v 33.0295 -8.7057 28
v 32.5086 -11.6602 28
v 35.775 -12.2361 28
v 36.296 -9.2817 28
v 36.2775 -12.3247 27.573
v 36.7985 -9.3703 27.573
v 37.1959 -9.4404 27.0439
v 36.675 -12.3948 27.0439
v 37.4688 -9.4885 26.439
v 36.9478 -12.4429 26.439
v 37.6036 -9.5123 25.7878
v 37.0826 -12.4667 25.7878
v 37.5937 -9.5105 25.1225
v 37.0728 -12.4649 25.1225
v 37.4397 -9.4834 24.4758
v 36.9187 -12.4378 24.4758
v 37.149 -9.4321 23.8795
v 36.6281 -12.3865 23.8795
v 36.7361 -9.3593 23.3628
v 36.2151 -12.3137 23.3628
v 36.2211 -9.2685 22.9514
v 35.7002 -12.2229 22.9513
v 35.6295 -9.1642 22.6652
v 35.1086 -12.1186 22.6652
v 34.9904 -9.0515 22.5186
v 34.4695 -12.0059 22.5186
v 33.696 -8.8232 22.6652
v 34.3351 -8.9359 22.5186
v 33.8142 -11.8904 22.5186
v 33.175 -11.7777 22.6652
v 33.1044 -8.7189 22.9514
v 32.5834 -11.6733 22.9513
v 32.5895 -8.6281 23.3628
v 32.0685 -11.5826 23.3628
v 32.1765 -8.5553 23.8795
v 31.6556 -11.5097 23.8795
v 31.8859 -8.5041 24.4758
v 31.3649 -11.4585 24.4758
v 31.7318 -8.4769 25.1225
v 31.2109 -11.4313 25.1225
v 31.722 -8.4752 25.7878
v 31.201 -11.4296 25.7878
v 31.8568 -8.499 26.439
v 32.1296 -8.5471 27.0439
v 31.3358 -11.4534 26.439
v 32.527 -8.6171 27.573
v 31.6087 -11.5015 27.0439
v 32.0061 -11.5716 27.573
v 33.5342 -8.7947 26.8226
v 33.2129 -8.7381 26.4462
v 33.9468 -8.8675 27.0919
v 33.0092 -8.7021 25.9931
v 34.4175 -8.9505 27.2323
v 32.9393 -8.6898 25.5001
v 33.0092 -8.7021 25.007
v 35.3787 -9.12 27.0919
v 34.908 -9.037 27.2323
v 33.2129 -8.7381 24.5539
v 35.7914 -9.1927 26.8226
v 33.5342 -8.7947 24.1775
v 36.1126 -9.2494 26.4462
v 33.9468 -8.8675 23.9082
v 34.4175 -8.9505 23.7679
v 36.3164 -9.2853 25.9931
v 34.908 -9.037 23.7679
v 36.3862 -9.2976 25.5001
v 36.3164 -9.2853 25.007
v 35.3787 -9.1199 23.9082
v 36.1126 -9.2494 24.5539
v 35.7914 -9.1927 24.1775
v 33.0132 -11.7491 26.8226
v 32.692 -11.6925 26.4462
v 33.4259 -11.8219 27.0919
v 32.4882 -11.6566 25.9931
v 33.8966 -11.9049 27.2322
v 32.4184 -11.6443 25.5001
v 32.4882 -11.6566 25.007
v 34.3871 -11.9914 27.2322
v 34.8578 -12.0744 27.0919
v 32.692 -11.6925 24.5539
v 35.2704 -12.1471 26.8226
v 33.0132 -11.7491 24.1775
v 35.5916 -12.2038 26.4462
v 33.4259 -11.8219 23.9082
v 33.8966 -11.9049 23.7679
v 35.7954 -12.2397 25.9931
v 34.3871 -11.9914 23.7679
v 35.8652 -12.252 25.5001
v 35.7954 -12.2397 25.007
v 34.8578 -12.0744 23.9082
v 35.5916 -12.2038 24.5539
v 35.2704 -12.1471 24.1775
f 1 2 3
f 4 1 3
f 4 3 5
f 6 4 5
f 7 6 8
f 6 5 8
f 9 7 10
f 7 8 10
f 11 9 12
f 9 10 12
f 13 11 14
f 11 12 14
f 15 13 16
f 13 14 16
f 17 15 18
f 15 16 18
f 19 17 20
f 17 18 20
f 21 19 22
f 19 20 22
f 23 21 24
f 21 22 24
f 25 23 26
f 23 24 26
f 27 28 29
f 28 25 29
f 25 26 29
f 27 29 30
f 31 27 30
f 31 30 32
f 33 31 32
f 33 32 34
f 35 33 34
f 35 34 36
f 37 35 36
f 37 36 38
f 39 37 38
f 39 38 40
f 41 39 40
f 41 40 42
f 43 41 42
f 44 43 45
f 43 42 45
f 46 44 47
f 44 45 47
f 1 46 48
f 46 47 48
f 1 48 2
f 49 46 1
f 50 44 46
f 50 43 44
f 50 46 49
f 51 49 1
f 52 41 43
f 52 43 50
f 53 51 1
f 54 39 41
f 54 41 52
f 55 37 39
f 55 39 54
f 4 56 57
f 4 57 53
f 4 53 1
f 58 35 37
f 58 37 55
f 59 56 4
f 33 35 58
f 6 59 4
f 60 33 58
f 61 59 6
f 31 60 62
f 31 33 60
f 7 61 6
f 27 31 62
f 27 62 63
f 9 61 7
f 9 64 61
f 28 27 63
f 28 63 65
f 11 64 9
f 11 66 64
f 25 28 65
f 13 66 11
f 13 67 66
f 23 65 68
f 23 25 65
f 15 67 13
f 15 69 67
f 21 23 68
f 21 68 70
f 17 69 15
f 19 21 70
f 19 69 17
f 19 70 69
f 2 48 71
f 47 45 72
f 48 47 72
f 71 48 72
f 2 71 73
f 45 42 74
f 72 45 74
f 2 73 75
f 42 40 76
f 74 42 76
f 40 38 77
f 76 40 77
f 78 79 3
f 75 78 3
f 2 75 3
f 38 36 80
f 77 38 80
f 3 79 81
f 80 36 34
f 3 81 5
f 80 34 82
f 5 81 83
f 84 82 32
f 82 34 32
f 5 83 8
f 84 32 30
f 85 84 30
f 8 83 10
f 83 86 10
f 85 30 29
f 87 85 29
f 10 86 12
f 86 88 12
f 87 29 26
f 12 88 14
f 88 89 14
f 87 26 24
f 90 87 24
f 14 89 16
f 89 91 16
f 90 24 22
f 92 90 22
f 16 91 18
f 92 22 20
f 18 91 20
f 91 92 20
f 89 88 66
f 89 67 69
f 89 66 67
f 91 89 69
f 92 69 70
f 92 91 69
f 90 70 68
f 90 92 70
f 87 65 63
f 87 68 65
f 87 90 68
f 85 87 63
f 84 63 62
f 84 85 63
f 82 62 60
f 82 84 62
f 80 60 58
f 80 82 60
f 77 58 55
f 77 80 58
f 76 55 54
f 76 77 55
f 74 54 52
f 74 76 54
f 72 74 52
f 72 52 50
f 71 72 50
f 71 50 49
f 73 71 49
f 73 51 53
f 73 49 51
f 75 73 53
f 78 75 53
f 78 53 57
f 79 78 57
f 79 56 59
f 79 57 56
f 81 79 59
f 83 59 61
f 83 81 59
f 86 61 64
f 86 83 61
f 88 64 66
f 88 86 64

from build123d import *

# Parameters (mm, degrees)
PAD013_DEPTH                = 3
CYLINDER043_R               = 1.75
CYLINDER043_DEPTH           = 18
CYLINDER043_ROLL_ANGLE      = -89.999776
CYLINDER043_PITCH_ANGLE     = 1.4e-05
CYLINDER043_PLACEMENT_ANGLE = -9.999925
CYLINDER041_R               = 3
CYLINDER041_DEPTH           = 3
CYLINDER041_ROLL_ANGLE      = -89.999776
CYLINDER041_PITCH_ANGLE     = 1.4e-05
CYLINDER041_PLACEMENT_ANGLE = -9.999925


with BuildPart() as steg_o001:
    # Sketch013 → Pad013 (new body)
    with BuildSketch(Plane.XY):
        with BuildLine():
            add(Edge.make_bspline(
                [(44.997663, -28.408983), (45.245046, -6.764399), (28.5, -0.316434)],
                knots=[1.556693, 1.556693, 1.556693, 2.83913, 2.83913, 2.83913], degree=2, weights=[1, 0.801368, 1]))
            Line((28.5, -0.316434), (28.5, -25.5))
            Line((28.5, -25.5), (44.997663, -28.408983))
        make_face()
    extrude(amount=PAD013_DEPTH)


with BuildPart() as steg_o001_1:
    # Body015 placement: moved
    add(steg_o001.part.moved(Location((0, 0, 28))))


with BuildPart() as cylinder043:
    # Cylinder043 → Cylinder043 (new body)
    with BuildSketch(Plane.XY):
        Circle(CYLINDER043_R)
    extrude(amount=CYLINDER043_DEPTH)


with BuildPart() as cylinder043_1:
    # Cylinder043 roll: moved
    add(cylinder043.part.rotate(Axis((0, 0, 0), (1, 0, 0)), CYLINDER043_ROLL_ANGLE))


with BuildPart() as cylinder043_2:
    # Cylinder043 pitch: moved
    add(cylinder043_1.part.rotate(Axis((0, 0, 0), (0, 1, 0)), CYLINDER043_PITCH_ANGLE))


with BuildPart() as cylinder043_3:
    # Cylinder043 placement: moved
    add(cylinder043_2.part.moved(Location((32.058057, -23.765835, 25.500009))).rotate(Axis((32.058057, -23.765835, 25.500009), (0, 0, 1)), CYLINDER043_PLACEMENT_ANGLE))


with BuildPart() as cut059:
    # Cylinder041 → Cylinder041 (new body)
    with BuildSketch(Plane.XY):
        Circle(CYLINDER041_R)
    extrude(amount=CYLINDER041_DEPTH)


with BuildPart() as cut059_1:
    # Cylinder041 roll: moved
    add(cut059.part.rotate(Axis((0, 0, 0), (1, 0, 0)), CYLINDER041_ROLL_ANGLE))


with BuildPart() as cut059_2:
    # Cylinder041 pitch: moved
    add(cut059_1.part.rotate(Axis((0, 0, 0), (0, 1, 0)), CYLINDER041_PITCH_ANGLE))


with BuildPart() as cut059_3:
    # Cylinder041 placement: moved
    add(cut059_2.part.moved(Location((34.14182, -11.94814, 25.500056))).rotate(Axis((34.14182, -11.94814, 25.500056), (0, 0, 1)), CYLINDER041_PLACEMENT_ANGLE))

    # Cut039: cut Cylinder043
    add(cylinder043_3.part, mode=Mode.SUBTRACT)

    # Cut059: cut steg_O001
    add(steg_o001_1.part, mode=Mode.SUBTRACT)


solid = cut059_3.part
